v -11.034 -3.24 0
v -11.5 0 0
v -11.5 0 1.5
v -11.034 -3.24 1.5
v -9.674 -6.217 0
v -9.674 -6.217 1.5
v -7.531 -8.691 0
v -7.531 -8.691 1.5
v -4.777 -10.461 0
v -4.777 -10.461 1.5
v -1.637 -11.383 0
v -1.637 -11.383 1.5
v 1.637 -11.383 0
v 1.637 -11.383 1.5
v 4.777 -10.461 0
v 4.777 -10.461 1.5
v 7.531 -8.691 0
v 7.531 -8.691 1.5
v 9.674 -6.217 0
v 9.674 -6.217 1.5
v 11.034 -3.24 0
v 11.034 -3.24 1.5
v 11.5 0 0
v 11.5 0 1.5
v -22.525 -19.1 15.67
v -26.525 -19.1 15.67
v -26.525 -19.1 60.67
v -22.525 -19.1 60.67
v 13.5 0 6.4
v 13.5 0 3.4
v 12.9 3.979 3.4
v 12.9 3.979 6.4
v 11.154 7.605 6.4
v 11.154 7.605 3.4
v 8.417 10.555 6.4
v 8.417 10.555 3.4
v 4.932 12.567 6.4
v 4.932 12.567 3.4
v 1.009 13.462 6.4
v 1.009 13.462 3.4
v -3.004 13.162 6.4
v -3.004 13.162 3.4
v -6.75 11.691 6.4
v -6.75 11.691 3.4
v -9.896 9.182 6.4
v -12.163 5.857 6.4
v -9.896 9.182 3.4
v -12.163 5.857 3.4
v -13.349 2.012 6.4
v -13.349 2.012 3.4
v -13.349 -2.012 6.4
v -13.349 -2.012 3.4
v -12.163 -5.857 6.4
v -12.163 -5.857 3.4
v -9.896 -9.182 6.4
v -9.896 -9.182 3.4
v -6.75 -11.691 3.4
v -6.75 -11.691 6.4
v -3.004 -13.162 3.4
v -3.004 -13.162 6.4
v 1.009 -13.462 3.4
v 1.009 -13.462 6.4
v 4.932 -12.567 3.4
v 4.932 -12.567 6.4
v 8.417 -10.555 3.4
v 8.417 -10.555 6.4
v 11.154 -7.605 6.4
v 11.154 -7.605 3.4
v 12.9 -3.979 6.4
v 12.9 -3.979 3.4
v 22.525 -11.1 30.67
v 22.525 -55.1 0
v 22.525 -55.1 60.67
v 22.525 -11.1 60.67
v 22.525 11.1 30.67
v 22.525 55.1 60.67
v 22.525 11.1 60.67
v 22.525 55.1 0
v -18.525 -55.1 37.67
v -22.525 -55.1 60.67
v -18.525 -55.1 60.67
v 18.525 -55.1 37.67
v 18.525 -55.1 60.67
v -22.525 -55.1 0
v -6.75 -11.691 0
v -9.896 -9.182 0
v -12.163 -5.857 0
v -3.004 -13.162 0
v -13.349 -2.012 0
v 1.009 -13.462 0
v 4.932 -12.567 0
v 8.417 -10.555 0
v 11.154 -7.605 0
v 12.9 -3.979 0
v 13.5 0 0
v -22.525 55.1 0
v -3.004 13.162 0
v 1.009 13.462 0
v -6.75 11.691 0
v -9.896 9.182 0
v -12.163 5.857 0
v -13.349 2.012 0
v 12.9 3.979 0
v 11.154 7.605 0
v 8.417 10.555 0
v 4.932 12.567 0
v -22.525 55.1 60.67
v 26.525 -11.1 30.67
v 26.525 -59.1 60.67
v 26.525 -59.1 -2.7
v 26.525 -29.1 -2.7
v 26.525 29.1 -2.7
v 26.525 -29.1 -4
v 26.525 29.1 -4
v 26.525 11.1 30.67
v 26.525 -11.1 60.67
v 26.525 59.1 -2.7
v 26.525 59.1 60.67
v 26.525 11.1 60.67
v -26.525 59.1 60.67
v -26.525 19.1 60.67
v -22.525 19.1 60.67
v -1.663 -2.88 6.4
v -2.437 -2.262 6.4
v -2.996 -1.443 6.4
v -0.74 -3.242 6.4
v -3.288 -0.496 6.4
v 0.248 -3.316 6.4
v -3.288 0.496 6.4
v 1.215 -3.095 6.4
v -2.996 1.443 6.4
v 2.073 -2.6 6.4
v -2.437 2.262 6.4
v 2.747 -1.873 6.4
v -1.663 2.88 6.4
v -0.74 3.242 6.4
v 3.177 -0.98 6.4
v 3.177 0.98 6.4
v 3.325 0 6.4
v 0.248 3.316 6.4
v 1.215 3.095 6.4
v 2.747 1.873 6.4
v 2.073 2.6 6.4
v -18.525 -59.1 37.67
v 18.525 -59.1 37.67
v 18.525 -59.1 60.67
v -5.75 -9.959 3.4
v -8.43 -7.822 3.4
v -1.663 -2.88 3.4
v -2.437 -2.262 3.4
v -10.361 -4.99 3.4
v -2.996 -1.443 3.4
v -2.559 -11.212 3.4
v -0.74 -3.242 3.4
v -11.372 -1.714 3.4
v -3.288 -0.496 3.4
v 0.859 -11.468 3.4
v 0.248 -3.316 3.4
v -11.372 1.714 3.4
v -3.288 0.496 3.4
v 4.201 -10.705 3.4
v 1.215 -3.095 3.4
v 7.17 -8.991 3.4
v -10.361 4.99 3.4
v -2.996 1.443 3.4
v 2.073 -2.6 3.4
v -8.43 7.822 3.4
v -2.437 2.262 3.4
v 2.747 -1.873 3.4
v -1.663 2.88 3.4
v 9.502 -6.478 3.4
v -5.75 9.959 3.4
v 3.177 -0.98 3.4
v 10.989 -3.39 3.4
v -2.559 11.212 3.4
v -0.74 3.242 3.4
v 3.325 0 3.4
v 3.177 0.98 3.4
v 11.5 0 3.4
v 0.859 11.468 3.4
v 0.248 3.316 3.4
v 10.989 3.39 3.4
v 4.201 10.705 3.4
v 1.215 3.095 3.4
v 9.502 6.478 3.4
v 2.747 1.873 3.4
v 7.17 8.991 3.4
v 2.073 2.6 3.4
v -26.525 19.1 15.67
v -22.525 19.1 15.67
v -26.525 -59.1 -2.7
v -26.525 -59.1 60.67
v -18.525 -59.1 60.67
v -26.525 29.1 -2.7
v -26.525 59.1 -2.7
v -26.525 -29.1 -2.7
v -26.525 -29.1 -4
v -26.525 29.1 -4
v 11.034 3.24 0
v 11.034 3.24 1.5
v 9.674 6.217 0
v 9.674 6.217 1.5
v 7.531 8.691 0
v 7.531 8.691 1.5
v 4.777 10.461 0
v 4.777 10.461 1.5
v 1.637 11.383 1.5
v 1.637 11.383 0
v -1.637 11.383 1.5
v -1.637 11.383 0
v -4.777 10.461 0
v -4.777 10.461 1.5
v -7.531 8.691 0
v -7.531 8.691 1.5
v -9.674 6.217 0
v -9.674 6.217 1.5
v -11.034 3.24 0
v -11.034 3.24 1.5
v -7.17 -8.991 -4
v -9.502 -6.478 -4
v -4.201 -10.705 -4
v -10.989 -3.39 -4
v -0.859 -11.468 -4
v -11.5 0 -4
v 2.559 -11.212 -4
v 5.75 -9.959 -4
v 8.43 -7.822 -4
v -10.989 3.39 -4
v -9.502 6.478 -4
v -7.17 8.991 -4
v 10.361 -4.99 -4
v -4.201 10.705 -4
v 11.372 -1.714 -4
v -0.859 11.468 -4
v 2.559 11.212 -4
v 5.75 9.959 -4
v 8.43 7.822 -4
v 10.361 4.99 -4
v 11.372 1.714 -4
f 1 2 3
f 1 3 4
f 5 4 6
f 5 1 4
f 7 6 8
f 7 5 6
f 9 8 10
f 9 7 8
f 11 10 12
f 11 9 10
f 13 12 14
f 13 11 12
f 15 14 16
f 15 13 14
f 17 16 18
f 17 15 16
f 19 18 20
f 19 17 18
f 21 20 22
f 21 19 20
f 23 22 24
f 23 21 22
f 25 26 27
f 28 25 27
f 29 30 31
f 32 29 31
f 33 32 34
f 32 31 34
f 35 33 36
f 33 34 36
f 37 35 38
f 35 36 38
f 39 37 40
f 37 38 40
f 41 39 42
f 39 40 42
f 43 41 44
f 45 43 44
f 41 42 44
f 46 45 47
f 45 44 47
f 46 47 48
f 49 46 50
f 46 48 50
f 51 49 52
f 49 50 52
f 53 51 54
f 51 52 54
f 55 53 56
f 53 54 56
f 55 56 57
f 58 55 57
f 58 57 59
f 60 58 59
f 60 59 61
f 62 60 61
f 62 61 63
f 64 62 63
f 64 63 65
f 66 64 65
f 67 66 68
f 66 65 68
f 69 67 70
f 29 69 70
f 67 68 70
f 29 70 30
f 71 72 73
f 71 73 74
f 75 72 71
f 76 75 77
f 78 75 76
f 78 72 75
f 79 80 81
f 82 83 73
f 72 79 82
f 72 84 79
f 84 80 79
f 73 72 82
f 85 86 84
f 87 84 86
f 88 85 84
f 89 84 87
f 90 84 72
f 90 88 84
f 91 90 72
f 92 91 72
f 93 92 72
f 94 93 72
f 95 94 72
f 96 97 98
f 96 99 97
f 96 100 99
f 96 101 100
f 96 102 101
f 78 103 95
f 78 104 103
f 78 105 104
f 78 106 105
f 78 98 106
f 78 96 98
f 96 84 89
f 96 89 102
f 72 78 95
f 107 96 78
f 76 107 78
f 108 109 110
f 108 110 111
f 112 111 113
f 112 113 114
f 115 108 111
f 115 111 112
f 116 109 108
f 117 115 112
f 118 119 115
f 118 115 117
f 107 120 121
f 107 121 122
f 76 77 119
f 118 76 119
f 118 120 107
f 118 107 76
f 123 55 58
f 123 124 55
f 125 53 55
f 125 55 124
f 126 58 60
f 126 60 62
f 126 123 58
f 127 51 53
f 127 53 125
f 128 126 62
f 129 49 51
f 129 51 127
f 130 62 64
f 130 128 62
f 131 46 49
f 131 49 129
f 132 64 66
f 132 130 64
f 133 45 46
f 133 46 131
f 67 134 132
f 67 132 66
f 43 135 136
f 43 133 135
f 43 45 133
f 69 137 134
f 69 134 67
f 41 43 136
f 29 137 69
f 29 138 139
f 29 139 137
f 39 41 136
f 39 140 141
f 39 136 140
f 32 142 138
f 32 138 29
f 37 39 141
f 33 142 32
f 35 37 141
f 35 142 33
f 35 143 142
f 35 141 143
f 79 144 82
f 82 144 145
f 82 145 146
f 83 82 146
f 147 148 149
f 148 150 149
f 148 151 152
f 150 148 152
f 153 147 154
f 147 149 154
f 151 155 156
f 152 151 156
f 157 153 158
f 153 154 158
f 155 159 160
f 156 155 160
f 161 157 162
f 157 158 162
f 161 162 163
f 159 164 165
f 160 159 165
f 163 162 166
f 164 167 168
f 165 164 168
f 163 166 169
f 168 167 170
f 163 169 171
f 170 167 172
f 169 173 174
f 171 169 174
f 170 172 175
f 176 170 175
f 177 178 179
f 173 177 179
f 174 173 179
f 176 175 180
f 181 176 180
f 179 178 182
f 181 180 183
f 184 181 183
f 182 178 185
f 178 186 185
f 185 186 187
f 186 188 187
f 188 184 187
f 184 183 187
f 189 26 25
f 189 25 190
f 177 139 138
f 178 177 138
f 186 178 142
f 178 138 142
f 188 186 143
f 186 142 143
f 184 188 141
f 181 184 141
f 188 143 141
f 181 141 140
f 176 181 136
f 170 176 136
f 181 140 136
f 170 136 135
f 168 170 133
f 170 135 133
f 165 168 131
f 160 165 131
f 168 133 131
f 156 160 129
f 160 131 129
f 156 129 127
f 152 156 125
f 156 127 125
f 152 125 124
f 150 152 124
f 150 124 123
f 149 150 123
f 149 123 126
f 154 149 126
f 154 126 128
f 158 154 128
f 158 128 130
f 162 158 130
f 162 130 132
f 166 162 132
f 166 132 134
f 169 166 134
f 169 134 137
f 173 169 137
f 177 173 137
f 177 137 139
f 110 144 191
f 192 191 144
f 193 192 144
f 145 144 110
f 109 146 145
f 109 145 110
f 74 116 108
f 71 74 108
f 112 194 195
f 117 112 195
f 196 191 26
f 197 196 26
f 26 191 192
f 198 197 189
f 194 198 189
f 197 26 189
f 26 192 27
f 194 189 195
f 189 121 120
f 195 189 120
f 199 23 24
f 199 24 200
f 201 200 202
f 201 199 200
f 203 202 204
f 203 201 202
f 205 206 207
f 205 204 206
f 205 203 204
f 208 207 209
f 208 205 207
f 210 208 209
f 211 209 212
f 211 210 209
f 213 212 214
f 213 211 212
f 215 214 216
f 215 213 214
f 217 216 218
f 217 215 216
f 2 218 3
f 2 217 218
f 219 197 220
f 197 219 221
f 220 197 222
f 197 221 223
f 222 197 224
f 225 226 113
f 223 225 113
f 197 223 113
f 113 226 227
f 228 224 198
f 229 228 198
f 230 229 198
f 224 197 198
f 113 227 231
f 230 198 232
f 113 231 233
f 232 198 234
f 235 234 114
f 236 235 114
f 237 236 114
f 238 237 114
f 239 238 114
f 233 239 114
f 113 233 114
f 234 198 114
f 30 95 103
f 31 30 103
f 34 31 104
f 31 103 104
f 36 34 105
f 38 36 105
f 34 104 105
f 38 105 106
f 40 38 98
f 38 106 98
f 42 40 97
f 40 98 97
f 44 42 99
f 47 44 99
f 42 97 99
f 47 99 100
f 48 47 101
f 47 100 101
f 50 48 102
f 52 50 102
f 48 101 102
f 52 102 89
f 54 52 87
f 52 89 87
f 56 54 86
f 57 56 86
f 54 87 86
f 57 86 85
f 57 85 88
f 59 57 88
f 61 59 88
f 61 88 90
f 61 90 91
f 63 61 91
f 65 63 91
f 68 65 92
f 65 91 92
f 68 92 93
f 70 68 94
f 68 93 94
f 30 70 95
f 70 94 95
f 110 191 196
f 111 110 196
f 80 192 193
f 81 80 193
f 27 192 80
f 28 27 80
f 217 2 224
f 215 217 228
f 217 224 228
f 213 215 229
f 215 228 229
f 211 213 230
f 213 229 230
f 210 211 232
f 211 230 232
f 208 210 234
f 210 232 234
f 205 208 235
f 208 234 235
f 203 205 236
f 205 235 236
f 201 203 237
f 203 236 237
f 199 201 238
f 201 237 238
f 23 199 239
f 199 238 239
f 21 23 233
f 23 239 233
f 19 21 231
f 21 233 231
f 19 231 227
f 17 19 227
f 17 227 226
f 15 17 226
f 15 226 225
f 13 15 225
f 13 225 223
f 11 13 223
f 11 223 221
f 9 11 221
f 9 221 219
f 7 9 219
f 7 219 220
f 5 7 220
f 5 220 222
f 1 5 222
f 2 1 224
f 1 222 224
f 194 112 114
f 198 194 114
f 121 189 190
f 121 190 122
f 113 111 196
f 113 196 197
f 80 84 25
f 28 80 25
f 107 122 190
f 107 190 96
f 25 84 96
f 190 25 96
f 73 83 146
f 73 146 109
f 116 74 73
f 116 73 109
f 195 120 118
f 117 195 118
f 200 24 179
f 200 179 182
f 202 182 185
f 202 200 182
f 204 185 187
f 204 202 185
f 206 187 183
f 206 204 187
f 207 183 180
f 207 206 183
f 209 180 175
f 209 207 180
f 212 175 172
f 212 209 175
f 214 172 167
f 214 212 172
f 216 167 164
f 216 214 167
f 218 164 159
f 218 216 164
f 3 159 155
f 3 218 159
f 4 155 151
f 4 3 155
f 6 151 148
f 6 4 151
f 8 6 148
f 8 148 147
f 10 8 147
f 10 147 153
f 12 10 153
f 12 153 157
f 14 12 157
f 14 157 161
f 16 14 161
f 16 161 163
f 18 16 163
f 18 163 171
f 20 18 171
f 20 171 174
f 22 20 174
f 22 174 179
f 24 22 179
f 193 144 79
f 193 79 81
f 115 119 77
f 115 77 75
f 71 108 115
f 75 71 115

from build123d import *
from build123d.topology import SkipClean

# Parameters (mm, degrees)
SKETCH1_W           = 53.05
SKETCH1_H           = 118.2
SKETCH1_W_2         = 45.05
SKETCH1_H_2         = 110.2
BOSS_EXTRUDE1_DEPTH = 60.67
SKETCH2_W           = 53.05
SKETCH2_H           = 118.2
BOSS_EXTRUDE2_DEPTH = 4
SKETCH3_W           = 30
SKETCH3_H           = 22.2
CUT_EXTRUDE1_DEPTH  = 4
SKETCH4_W           = 45
SKETCH4_H           = 38.2
CUT_EXTRUDE2_DEPTH  = 4
SKETCH5_W           = 37.05
SKETCH5_H           = 23
CUT_EXTRUDE3_DEPTH  = 4
SKETCH6_R           = 13.5
SKETCH6_R_2         = 11.5
BOSS_EXTRUDE3_DEPTH = 3.4
SKETCH9_R           = 11.5
CUT_EXTRUDE4_DEPTH  = 5.5
SKETCH10_W          = 1.3
SKETCH10_H          = 30
CUT_EXTRUDE6_DEPTH  = 100.939788873
SKETCH8_R           = 13.5
BOSS_EXTRUDE5_DEPTH = 3
SKETCH12_R          = 3.325
CUT_EXTRUDE8_DEPTH  = 85.508097393


with BuildPart() as part:
    # Sketch1 → Boss-Extrude1 (new body)
    with BuildSketch(Plane.XY):
        Rectangle(SKETCH1_W, SKETCH1_H)
        Rectangle(SKETCH1_W_2, SKETCH1_H_2, mode=Mode.SUBTRACT)
    extrude(amount=BOSS_EXTRUDE1_DEPTH)

    # Sketch2 → Boss-Extrude2 (add)
    with BuildSketch(Plane.XY):
        Rectangle(SKETCH2_W, SKETCH2_H)
    extrude(amount=-BOSS_EXTRUDE2_DEPTH)

    # Sketch3 → Cut-Extrude1 (cut)
    with BuildSketch(Plane(origin=(26.525, 0, 0), x_dir=(0, 0, -1), z_dir=(1, 0, 0))):
        with Locations((-45.67, 0)):
            Rectangle(SKETCH3_W, SKETCH3_H)
    extrude(amount=-CUT_EXTRUDE1_DEPTH, mode=Mode.SUBTRACT)

    # Sketch4 → Cut-Extrude2 (cut)
    with BuildSketch(Plane.ZY.offset(26.525)):
        with Locations((38.17, 0)):
            Rectangle(SKETCH4_W, SKETCH4_H)
    extrude(amount=-CUT_EXTRUDE2_DEPTH, mode=Mode.SUBTRACT)

    # Sketch5 → Cut-Extrude3 (cut)
    with BuildSketch(Plane.XZ.offset(59.1)):
        with Locations((0, 49.17)):
            Rectangle(SKETCH5_W, SKETCH5_H)
    extrude(amount=-CUT_EXTRUDE3_DEPTH, mode=Mode.SUBTRACT)

    # Sketch6 → Boss-Extrude3 (add)
    with BuildSketch(Plane.XY):
        Circle(SKETCH6_R)
        Circle(SKETCH6_R_2, mode=Mode.SUBTRACT)
    extrude(amount=BOSS_EXTRUDE3_DEPTH)

    # Sketch9 → Cut-Extrude4 (cut)
    with SkipClean():  # the faces are left unmerged after this step: merging them gives an invalid solid
        with BuildSketch(Plane(origin=(0, 0, -4), x_dir=(-1, 0, 0), z_dir=(0, 0, -1))):
            Circle(SKETCH9_R)
        extrude(amount=-CUT_EXTRUDE4_DEPTH, mode=Mode.SUBTRACT)
    add(part.part.scale(1), mode=Mode.REPLACE)  # the faces are merged on a copy

    # Sketch10 → Cut-Extrude6 (cut, through all)
    with BuildSketch(Plane(origin=(26.525, 0, 0), x_dir=(0, 0, -1), z_dir=(1, 0, 0))):
        with Locations((3.35, 44.1)):
            Rectangle(SKETCH10_W, SKETCH10_H)
        with Locations((3.35, -44.1)):
            Rectangle(SKETCH10_W, SKETCH10_H)
    extrude(amount=-CUT_EXTRUDE6_DEPTH, mode=Mode.SUBTRACT)

    # Sketch8 → Boss-Extrude5 (add)
    with SkipClean():  # the faces are left unmerged after this step: merging them gives an invalid solid
        with BuildSketch(Plane.XY.offset(3.4)):
            Circle(SKETCH8_R)
        extrude(amount=BOSS_EXTRUDE5_DEPTH)

    # Sketch12 → Cut-Extrude8 (cut, through all)
    with SkipClean():  # the faces are left unmerged after this step: merging them gives an invalid solid
        with BuildSketch(Plane.XY.offset(6.4)):
            Circle(SKETCH12_R)
        extrude(amount=-CUT_EXTRUDE8_DEPTH, mode=Mode.SUBTRACT)


solid = part.part
